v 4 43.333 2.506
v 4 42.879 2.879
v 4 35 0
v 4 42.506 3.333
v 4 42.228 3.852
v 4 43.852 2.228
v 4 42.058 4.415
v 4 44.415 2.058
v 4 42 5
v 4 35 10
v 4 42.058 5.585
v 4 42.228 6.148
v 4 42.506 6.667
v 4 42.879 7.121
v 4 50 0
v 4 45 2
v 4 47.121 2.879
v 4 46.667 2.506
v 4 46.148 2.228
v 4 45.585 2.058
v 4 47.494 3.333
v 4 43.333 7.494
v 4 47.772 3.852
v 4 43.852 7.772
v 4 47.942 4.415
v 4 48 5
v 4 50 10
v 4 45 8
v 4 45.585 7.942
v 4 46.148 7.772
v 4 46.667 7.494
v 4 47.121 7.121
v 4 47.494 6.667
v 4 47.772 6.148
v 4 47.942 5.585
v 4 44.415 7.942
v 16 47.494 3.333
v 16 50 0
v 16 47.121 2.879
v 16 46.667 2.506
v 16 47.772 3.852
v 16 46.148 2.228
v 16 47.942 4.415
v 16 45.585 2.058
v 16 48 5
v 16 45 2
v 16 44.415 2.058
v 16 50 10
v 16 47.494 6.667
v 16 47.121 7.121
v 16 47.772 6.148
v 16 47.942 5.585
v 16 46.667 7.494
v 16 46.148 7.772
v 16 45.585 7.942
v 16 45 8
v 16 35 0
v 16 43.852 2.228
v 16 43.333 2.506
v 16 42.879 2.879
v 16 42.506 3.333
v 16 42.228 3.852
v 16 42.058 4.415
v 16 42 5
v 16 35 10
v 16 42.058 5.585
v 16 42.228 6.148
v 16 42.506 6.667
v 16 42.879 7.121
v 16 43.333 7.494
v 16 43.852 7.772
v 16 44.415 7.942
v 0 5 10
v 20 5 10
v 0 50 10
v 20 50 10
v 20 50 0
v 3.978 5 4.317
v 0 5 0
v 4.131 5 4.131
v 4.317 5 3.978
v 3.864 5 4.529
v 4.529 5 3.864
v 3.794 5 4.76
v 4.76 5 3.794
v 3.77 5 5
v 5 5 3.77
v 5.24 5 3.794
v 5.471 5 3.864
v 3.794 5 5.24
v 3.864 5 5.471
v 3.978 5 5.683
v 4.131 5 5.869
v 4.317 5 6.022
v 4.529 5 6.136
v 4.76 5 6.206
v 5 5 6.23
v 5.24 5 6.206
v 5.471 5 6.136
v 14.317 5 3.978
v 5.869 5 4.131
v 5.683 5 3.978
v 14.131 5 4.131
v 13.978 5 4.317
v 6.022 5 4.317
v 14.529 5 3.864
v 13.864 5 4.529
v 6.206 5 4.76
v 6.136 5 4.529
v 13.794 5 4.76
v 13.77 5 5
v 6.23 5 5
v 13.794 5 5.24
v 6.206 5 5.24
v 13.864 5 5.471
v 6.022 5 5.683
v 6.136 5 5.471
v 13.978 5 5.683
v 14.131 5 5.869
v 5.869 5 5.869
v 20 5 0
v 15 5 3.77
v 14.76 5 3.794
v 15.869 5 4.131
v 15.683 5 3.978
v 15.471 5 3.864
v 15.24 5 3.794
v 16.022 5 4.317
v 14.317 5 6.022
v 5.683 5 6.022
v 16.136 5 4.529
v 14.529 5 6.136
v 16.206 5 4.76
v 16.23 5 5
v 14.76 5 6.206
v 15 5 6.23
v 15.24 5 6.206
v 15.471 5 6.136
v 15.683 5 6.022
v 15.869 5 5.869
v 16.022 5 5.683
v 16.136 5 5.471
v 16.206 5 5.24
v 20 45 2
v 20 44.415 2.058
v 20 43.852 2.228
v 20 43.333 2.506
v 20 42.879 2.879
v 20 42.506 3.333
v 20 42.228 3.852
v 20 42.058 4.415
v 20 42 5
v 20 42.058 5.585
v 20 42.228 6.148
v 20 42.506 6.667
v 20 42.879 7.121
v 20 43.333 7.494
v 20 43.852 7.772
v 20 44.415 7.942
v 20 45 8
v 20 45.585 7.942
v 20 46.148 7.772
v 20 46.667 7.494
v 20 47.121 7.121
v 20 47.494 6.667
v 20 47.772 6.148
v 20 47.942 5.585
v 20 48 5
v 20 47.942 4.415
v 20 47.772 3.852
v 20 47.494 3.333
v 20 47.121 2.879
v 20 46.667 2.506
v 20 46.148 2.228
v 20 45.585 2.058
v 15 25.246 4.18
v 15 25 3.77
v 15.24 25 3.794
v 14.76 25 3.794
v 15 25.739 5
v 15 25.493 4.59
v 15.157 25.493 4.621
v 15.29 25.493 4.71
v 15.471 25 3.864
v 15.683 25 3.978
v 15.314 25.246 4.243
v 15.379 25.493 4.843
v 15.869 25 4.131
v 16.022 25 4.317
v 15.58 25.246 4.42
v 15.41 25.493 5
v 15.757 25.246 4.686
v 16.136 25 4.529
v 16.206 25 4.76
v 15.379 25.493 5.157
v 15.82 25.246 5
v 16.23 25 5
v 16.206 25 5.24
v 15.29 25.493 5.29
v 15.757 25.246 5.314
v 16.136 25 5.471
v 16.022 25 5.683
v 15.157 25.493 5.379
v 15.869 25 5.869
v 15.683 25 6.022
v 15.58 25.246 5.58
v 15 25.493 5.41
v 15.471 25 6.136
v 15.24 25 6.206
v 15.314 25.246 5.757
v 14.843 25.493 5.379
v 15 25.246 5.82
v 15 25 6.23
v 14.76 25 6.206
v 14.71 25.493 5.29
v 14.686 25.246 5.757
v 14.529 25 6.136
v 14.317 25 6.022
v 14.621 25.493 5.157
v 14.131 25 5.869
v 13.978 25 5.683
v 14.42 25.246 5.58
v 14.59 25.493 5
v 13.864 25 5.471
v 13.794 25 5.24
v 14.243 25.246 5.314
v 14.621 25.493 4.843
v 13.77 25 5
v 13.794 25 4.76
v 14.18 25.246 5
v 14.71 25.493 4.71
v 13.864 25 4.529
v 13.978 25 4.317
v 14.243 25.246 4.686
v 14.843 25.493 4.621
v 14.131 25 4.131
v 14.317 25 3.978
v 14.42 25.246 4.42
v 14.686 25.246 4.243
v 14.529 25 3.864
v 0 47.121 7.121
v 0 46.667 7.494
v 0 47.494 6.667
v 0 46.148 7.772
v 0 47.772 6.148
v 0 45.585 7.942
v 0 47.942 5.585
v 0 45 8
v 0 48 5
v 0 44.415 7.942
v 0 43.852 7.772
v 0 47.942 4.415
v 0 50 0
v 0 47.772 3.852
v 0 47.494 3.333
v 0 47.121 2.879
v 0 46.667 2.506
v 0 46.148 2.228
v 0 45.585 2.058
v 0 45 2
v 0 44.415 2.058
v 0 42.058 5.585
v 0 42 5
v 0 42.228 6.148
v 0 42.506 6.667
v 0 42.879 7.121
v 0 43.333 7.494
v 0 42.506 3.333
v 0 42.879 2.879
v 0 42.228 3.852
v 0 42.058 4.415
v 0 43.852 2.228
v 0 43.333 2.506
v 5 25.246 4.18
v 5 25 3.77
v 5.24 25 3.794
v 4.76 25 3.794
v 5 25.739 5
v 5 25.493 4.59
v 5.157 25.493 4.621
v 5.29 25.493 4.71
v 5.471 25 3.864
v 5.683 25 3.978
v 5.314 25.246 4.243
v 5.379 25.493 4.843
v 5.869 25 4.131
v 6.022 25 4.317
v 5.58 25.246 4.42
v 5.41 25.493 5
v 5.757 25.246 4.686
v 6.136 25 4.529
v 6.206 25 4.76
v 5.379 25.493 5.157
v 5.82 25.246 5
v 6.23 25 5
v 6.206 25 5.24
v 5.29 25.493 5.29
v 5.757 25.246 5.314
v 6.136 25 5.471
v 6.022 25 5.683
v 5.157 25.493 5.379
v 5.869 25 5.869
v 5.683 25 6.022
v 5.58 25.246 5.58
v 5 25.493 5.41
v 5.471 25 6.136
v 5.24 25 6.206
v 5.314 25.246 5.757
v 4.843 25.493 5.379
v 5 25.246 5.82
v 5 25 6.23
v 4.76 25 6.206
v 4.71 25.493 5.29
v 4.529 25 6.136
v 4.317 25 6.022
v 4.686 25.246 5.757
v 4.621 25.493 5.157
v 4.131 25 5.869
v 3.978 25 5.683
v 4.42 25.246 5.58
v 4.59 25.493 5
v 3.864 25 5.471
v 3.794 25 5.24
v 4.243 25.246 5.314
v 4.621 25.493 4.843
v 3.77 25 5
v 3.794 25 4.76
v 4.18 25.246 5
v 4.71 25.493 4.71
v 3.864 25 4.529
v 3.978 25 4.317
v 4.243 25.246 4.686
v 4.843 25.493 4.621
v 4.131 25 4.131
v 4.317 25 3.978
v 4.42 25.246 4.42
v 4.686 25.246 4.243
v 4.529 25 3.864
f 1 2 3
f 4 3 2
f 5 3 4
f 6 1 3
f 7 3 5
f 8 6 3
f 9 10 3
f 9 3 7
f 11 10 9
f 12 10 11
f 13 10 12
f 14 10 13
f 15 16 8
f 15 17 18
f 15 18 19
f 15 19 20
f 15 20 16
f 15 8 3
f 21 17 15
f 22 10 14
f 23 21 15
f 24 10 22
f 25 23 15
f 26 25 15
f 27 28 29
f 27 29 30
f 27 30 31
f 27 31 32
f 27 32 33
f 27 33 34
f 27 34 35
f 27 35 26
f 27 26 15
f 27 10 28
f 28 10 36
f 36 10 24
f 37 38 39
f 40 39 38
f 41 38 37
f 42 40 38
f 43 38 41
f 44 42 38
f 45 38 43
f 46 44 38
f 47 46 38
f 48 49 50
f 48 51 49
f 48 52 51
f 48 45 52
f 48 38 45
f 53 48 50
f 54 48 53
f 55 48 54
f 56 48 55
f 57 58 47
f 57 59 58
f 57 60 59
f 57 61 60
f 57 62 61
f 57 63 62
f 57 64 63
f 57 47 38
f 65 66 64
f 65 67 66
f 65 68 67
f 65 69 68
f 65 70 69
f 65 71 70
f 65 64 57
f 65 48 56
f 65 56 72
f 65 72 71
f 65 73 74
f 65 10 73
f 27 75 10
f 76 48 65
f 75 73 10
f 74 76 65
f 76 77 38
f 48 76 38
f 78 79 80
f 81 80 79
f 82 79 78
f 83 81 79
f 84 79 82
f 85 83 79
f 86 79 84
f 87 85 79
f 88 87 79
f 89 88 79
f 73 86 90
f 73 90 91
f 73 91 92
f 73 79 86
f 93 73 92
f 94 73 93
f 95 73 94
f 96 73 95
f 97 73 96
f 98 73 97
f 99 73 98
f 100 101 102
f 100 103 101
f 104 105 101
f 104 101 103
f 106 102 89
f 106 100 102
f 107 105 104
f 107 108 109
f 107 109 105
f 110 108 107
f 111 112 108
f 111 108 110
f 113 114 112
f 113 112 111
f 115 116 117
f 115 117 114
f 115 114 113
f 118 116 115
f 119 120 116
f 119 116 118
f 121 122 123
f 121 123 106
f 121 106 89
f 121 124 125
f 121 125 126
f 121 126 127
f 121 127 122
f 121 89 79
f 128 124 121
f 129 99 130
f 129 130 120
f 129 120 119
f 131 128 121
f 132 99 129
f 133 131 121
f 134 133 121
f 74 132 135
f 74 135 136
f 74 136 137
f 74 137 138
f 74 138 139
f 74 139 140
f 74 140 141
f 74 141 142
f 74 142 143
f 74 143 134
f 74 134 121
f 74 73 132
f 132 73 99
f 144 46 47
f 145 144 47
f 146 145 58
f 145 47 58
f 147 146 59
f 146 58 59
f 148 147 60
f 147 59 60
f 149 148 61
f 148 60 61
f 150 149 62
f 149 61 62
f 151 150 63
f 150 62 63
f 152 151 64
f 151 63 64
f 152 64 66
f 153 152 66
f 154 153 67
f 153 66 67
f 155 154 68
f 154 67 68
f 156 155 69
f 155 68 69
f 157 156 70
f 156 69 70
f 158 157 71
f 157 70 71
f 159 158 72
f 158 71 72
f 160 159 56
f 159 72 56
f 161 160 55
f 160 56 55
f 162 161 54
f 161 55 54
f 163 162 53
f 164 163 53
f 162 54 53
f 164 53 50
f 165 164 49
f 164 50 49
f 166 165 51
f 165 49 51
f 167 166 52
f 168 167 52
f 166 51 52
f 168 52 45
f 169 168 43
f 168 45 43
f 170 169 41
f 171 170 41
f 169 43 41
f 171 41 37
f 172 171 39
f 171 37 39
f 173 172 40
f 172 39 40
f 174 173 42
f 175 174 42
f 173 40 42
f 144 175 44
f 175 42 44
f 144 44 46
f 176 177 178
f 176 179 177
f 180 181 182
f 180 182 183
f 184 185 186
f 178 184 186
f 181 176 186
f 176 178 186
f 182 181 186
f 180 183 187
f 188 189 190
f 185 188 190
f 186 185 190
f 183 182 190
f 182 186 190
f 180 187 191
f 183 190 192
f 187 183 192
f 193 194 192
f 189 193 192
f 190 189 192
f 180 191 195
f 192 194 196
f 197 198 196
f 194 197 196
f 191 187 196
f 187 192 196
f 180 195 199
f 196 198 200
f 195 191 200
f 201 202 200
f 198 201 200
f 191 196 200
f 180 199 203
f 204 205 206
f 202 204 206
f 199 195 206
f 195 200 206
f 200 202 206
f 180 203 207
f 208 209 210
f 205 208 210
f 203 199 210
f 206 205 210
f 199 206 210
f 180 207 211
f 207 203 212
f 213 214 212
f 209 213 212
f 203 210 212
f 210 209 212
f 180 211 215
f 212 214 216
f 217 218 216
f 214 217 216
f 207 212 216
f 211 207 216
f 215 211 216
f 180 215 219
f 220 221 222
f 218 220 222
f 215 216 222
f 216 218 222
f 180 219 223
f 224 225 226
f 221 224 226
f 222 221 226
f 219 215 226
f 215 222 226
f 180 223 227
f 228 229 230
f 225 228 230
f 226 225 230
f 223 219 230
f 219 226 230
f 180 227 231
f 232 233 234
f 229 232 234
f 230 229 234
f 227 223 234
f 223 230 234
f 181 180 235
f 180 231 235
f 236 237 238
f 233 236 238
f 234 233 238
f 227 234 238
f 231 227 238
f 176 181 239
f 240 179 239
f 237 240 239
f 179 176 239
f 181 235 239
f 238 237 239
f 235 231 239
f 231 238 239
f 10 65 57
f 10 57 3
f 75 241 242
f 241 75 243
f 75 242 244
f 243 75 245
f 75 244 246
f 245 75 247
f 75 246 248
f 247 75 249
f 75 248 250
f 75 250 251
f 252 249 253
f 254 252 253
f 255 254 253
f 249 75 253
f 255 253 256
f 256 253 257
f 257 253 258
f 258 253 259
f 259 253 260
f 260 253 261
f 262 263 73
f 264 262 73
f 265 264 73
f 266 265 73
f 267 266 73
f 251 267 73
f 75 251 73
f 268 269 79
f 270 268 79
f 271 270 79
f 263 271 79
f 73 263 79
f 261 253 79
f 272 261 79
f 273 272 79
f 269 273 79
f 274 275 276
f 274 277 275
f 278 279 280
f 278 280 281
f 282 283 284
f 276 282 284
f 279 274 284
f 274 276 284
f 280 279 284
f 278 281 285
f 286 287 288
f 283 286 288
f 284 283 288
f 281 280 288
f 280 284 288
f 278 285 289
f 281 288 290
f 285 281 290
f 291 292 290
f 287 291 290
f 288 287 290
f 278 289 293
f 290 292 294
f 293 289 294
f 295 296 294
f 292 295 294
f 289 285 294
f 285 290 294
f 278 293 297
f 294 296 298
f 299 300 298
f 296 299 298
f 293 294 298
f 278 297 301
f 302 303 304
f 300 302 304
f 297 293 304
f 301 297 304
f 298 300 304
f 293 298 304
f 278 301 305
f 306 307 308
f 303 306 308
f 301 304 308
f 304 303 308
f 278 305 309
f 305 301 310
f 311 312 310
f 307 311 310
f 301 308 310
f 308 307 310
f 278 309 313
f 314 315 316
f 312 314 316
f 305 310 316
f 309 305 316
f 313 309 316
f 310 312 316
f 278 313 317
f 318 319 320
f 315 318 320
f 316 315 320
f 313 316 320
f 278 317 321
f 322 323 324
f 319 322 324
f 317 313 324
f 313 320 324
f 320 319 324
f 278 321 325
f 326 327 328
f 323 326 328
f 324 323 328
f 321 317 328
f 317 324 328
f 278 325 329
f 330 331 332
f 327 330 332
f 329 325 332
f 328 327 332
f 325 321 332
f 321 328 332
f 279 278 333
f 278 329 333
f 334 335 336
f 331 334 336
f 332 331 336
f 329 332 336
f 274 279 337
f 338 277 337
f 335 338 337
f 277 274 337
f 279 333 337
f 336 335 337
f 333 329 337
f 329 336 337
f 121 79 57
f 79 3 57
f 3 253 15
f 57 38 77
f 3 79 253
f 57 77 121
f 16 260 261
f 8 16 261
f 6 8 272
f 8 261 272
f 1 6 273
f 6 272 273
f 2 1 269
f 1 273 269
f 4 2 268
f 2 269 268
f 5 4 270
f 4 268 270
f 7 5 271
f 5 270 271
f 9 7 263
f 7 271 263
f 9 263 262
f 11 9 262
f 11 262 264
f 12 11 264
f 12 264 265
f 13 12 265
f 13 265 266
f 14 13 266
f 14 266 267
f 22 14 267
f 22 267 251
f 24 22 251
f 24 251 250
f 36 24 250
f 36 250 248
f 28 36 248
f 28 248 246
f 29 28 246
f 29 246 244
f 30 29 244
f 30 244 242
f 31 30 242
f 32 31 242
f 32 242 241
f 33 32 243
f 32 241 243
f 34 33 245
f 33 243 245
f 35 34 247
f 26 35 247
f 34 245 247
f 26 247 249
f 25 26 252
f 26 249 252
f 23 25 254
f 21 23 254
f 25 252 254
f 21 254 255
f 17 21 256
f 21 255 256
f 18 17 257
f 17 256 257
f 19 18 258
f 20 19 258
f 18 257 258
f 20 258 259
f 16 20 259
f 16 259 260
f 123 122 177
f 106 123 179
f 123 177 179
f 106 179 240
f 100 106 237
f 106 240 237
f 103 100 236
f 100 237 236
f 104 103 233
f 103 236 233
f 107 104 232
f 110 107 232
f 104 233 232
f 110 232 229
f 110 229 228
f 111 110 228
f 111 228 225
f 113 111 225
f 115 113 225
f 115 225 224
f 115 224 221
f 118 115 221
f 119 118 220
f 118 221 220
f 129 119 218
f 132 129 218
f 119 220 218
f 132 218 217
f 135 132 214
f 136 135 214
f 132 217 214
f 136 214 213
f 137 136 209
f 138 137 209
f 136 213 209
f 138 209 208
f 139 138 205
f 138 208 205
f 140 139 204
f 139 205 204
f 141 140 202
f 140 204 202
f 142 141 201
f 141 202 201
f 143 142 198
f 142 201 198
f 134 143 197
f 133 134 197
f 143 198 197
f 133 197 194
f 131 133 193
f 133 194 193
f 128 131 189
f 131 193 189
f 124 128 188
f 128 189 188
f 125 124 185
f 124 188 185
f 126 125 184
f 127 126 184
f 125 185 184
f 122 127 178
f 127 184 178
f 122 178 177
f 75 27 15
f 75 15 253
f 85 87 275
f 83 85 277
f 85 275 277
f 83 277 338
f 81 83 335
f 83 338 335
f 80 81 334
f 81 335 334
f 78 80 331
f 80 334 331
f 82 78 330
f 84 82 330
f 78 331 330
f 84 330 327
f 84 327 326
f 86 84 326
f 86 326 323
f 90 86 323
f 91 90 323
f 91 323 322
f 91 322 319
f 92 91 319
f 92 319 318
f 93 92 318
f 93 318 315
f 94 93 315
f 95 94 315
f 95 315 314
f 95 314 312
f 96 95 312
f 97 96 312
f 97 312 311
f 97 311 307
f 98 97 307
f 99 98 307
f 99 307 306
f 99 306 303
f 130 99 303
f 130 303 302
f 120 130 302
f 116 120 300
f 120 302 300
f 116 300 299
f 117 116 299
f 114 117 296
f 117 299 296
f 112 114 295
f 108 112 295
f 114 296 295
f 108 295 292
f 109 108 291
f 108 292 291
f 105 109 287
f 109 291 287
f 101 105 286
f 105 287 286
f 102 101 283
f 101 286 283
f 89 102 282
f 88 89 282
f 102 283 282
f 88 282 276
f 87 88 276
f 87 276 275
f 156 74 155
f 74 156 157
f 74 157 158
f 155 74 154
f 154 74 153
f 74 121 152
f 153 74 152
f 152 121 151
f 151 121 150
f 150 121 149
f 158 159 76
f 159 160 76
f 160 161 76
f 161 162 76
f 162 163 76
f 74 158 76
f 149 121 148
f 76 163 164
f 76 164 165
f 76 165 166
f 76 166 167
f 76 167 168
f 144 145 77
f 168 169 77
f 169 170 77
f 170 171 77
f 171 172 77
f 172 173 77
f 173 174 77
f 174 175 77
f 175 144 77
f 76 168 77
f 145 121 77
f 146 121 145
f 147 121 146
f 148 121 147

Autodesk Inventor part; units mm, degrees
ref_plane "YZ Plane" through (0, 0, 0) normal (1, 0, 0) x (0, 1, 0)
ref_plane "XZ Plane" through (0, 0, 0) normal (0, 1, 0) x (-1, 0, 0)
ref_plane "XY Plane" through (0, 0, 0) normal (0, 0, 1) x (1, 0, 0)
sketch "スケッチ1" plane through (0, 0, 0) normal (0, 0, 1) x (1, 0, 0)
  line L0 (0, 0) -> (20, 0)
  line L1 (20, 0) -> (20, 50)
  line L2 (20, 50) -> (0, 50)
  line L3 (0, 50) -> (0, 0)
  dimension "d0" = 20
  dimension "d1" = 50
extrude "押し出し1" add sketch "スケッチ1" along normal blind 10
sketch "スケッチ2" plane through (0, 0, 10) normal (0, 0, 1) x (1, 0, 0)
  line L0 (20, 50) -> (0, 50) projected
  line L1 (4, 50) -> (16, 50)
  line L2 (16, 50) -> (16, 40)
  line L3 (16, 40) -> (4, 40)
  line L4 (4, 40) -> (4, 50)
  line L5 (0, 50) -> (0, 0) projected
  dimension "d4" = 12
  dimension "d5" = 4
  dimension "d6" = 10
extrude "押し出し2" cut sketch "スケッチ2" against normal blind 10
sketch "スケッチ3" plane through (20, 0, 0) normal (1, 0, 0) x (0, 0, -1)
  line L0 (0, 50) -> (-10, 50) projected
  line L1 (0, 0) -> (0, 50) projected
  point P0 (-5, 45)
  dimension "d9" = 5
  dimension "d10" = 5
hole "穴1" at (20, 45, 5) direction (-1, 0, 0) diameter 6 end through all
sketch "スケッチ4" plane through (0, 0, 0) normal (0, -1, 0) x (1, 0, 0)
  line L0 (0, 0) -> (0, 10) projected
  line L1 (0, 10) -> (20, 10) projected
  line L2 (0, 0) -> (20, 0) projected
  line L3 (20, 0) -> (20, 10) projected
  point P0 (5, 5)
  point P1 (15, 5)
  dimension "d18" = 5
  dimension "d19" = 5
  dimension "d20" = 5
  dimension "d21" = 5
hole "穴2" at (5, 0, 5) at (15, 0, 5) direction (0, 1, 0) diameter 2.459 depth 25 tip angle 118 thread size "M3x0.5" class "6H" standard "ISO Metric profile"
sketch "スケッチ5" plane through (0, 0, 10) normal (0, 0, 1) x (1, 0, 0)
  line L0 (4, 40) -> (16, 40) projected
  line L1 (4, 40) -> (16, 40)
  line L2 (16, 40) -> (16, 35)
  line L3 (16, 35) -> (4, 35)
  line L4 (4, 35) -> (4, 40)
  point P0 (0, 0)
  dimension "d29" = 5
extrude "押し出し3" cut sketch "スケッチ5" against normal blind 10
sketch "スケッチ6" plane through (0, 0, 10) normal (0, 0, 1) x (1, 0, 0)
  line L0 (0, 50) -> (0, 0) projected
  line L1 (20, 0) -> (20, 50) projected
  line L2 (0, 5) -> (20, 5)
  line L3 (20, 5) -> (20, 0)
  line L4 (20, 0) -> (0, 0)
  line L5 (0, 0) -> (0, 5)
  point P0 (20, 5)
  dimension "d32" = 5
extrude "押し出し4" cut sketch "スケッチ6" against normal blind 10
properties part number "アーム支え"
